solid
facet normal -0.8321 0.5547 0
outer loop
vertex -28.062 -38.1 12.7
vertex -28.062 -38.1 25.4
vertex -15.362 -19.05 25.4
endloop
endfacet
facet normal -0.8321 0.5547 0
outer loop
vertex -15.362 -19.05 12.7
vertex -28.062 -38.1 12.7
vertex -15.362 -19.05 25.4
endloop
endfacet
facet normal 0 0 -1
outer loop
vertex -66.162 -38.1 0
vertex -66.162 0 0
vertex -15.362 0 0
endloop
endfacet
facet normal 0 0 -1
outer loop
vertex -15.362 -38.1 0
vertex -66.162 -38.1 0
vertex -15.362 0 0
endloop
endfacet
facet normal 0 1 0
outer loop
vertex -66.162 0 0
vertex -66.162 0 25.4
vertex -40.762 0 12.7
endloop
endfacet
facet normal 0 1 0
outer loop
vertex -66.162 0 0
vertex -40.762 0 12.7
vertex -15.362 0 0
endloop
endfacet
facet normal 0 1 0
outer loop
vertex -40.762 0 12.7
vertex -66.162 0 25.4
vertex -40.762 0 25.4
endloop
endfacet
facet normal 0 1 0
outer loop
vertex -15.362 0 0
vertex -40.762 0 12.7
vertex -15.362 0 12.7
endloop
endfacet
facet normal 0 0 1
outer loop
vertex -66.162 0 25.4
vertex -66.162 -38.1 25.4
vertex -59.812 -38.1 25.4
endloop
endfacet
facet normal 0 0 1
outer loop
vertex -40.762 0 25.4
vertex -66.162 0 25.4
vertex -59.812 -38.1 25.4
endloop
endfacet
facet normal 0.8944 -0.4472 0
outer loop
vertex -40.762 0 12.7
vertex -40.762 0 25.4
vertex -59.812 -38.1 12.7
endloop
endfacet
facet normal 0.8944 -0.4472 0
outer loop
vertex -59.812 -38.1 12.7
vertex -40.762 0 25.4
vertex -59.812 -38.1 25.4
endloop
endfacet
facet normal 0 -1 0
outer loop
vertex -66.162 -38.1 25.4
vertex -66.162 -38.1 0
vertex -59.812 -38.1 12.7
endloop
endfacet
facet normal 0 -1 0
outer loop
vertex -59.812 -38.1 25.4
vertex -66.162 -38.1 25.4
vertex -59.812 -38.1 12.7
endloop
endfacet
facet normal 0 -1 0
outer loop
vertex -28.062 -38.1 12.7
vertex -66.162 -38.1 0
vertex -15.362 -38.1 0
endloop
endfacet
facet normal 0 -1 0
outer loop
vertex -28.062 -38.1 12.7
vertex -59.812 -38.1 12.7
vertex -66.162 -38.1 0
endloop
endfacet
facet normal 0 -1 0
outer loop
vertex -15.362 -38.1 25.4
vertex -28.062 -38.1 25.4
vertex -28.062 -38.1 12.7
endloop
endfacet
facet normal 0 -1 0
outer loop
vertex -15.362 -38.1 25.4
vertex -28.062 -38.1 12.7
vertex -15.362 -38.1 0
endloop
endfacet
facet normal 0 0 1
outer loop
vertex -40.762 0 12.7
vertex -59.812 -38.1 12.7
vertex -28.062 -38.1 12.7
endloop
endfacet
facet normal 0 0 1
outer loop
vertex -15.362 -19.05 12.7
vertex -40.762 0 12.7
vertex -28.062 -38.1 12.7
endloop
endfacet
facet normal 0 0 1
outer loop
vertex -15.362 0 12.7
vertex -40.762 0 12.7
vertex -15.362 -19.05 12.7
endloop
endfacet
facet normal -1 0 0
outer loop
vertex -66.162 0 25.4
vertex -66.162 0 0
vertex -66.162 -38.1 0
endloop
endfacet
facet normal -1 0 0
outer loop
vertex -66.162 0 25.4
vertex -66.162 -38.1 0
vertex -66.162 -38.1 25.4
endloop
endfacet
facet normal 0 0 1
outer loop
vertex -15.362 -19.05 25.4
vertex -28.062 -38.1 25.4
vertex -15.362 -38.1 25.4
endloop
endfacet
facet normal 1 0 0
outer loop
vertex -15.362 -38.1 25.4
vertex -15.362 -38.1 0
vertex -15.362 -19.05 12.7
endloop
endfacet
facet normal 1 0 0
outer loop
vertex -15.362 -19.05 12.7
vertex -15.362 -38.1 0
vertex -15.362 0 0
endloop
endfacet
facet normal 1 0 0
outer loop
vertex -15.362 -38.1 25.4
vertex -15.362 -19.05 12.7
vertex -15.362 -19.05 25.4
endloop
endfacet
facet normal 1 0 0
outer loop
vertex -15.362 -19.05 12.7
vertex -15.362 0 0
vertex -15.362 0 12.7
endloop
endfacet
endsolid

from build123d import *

# Parameters (mm, degrees)
F0_W     = 50.8
F0_H     = 25.4
F1_DEPTH = 38.1
F3_DEPTH = 12.7


# Not quite as in the source:
# - a length typed as a fraction of an inch, garbled in the dataset ("3 / 203.2 mm" for 3/8 in), is restored


with BuildPart() as f1:
    # F0 (on Front) → F1 (new body)
    with BuildSketch(Plane.XZ):
        with Locations((-40.7616753732, 12.7)):
            Rectangle(F0_W, F0_H)
    extrude(amount=F1_DEPTH)

    # F2 (on face) → F3 (cut)
    with BuildSketch(Plane.XY.offset(25.4)):
        Polygon((-15.3616753732, 0), (-40.7616753732, 0), (-59.8116753732, -38.1), (-28.0616753732, -38.1), (-15.3616753732, -19.05), align=None)
    extrude(amount=-F3_DEPTH, mode=Mode.SUBTRACT)


solid = f1.part
